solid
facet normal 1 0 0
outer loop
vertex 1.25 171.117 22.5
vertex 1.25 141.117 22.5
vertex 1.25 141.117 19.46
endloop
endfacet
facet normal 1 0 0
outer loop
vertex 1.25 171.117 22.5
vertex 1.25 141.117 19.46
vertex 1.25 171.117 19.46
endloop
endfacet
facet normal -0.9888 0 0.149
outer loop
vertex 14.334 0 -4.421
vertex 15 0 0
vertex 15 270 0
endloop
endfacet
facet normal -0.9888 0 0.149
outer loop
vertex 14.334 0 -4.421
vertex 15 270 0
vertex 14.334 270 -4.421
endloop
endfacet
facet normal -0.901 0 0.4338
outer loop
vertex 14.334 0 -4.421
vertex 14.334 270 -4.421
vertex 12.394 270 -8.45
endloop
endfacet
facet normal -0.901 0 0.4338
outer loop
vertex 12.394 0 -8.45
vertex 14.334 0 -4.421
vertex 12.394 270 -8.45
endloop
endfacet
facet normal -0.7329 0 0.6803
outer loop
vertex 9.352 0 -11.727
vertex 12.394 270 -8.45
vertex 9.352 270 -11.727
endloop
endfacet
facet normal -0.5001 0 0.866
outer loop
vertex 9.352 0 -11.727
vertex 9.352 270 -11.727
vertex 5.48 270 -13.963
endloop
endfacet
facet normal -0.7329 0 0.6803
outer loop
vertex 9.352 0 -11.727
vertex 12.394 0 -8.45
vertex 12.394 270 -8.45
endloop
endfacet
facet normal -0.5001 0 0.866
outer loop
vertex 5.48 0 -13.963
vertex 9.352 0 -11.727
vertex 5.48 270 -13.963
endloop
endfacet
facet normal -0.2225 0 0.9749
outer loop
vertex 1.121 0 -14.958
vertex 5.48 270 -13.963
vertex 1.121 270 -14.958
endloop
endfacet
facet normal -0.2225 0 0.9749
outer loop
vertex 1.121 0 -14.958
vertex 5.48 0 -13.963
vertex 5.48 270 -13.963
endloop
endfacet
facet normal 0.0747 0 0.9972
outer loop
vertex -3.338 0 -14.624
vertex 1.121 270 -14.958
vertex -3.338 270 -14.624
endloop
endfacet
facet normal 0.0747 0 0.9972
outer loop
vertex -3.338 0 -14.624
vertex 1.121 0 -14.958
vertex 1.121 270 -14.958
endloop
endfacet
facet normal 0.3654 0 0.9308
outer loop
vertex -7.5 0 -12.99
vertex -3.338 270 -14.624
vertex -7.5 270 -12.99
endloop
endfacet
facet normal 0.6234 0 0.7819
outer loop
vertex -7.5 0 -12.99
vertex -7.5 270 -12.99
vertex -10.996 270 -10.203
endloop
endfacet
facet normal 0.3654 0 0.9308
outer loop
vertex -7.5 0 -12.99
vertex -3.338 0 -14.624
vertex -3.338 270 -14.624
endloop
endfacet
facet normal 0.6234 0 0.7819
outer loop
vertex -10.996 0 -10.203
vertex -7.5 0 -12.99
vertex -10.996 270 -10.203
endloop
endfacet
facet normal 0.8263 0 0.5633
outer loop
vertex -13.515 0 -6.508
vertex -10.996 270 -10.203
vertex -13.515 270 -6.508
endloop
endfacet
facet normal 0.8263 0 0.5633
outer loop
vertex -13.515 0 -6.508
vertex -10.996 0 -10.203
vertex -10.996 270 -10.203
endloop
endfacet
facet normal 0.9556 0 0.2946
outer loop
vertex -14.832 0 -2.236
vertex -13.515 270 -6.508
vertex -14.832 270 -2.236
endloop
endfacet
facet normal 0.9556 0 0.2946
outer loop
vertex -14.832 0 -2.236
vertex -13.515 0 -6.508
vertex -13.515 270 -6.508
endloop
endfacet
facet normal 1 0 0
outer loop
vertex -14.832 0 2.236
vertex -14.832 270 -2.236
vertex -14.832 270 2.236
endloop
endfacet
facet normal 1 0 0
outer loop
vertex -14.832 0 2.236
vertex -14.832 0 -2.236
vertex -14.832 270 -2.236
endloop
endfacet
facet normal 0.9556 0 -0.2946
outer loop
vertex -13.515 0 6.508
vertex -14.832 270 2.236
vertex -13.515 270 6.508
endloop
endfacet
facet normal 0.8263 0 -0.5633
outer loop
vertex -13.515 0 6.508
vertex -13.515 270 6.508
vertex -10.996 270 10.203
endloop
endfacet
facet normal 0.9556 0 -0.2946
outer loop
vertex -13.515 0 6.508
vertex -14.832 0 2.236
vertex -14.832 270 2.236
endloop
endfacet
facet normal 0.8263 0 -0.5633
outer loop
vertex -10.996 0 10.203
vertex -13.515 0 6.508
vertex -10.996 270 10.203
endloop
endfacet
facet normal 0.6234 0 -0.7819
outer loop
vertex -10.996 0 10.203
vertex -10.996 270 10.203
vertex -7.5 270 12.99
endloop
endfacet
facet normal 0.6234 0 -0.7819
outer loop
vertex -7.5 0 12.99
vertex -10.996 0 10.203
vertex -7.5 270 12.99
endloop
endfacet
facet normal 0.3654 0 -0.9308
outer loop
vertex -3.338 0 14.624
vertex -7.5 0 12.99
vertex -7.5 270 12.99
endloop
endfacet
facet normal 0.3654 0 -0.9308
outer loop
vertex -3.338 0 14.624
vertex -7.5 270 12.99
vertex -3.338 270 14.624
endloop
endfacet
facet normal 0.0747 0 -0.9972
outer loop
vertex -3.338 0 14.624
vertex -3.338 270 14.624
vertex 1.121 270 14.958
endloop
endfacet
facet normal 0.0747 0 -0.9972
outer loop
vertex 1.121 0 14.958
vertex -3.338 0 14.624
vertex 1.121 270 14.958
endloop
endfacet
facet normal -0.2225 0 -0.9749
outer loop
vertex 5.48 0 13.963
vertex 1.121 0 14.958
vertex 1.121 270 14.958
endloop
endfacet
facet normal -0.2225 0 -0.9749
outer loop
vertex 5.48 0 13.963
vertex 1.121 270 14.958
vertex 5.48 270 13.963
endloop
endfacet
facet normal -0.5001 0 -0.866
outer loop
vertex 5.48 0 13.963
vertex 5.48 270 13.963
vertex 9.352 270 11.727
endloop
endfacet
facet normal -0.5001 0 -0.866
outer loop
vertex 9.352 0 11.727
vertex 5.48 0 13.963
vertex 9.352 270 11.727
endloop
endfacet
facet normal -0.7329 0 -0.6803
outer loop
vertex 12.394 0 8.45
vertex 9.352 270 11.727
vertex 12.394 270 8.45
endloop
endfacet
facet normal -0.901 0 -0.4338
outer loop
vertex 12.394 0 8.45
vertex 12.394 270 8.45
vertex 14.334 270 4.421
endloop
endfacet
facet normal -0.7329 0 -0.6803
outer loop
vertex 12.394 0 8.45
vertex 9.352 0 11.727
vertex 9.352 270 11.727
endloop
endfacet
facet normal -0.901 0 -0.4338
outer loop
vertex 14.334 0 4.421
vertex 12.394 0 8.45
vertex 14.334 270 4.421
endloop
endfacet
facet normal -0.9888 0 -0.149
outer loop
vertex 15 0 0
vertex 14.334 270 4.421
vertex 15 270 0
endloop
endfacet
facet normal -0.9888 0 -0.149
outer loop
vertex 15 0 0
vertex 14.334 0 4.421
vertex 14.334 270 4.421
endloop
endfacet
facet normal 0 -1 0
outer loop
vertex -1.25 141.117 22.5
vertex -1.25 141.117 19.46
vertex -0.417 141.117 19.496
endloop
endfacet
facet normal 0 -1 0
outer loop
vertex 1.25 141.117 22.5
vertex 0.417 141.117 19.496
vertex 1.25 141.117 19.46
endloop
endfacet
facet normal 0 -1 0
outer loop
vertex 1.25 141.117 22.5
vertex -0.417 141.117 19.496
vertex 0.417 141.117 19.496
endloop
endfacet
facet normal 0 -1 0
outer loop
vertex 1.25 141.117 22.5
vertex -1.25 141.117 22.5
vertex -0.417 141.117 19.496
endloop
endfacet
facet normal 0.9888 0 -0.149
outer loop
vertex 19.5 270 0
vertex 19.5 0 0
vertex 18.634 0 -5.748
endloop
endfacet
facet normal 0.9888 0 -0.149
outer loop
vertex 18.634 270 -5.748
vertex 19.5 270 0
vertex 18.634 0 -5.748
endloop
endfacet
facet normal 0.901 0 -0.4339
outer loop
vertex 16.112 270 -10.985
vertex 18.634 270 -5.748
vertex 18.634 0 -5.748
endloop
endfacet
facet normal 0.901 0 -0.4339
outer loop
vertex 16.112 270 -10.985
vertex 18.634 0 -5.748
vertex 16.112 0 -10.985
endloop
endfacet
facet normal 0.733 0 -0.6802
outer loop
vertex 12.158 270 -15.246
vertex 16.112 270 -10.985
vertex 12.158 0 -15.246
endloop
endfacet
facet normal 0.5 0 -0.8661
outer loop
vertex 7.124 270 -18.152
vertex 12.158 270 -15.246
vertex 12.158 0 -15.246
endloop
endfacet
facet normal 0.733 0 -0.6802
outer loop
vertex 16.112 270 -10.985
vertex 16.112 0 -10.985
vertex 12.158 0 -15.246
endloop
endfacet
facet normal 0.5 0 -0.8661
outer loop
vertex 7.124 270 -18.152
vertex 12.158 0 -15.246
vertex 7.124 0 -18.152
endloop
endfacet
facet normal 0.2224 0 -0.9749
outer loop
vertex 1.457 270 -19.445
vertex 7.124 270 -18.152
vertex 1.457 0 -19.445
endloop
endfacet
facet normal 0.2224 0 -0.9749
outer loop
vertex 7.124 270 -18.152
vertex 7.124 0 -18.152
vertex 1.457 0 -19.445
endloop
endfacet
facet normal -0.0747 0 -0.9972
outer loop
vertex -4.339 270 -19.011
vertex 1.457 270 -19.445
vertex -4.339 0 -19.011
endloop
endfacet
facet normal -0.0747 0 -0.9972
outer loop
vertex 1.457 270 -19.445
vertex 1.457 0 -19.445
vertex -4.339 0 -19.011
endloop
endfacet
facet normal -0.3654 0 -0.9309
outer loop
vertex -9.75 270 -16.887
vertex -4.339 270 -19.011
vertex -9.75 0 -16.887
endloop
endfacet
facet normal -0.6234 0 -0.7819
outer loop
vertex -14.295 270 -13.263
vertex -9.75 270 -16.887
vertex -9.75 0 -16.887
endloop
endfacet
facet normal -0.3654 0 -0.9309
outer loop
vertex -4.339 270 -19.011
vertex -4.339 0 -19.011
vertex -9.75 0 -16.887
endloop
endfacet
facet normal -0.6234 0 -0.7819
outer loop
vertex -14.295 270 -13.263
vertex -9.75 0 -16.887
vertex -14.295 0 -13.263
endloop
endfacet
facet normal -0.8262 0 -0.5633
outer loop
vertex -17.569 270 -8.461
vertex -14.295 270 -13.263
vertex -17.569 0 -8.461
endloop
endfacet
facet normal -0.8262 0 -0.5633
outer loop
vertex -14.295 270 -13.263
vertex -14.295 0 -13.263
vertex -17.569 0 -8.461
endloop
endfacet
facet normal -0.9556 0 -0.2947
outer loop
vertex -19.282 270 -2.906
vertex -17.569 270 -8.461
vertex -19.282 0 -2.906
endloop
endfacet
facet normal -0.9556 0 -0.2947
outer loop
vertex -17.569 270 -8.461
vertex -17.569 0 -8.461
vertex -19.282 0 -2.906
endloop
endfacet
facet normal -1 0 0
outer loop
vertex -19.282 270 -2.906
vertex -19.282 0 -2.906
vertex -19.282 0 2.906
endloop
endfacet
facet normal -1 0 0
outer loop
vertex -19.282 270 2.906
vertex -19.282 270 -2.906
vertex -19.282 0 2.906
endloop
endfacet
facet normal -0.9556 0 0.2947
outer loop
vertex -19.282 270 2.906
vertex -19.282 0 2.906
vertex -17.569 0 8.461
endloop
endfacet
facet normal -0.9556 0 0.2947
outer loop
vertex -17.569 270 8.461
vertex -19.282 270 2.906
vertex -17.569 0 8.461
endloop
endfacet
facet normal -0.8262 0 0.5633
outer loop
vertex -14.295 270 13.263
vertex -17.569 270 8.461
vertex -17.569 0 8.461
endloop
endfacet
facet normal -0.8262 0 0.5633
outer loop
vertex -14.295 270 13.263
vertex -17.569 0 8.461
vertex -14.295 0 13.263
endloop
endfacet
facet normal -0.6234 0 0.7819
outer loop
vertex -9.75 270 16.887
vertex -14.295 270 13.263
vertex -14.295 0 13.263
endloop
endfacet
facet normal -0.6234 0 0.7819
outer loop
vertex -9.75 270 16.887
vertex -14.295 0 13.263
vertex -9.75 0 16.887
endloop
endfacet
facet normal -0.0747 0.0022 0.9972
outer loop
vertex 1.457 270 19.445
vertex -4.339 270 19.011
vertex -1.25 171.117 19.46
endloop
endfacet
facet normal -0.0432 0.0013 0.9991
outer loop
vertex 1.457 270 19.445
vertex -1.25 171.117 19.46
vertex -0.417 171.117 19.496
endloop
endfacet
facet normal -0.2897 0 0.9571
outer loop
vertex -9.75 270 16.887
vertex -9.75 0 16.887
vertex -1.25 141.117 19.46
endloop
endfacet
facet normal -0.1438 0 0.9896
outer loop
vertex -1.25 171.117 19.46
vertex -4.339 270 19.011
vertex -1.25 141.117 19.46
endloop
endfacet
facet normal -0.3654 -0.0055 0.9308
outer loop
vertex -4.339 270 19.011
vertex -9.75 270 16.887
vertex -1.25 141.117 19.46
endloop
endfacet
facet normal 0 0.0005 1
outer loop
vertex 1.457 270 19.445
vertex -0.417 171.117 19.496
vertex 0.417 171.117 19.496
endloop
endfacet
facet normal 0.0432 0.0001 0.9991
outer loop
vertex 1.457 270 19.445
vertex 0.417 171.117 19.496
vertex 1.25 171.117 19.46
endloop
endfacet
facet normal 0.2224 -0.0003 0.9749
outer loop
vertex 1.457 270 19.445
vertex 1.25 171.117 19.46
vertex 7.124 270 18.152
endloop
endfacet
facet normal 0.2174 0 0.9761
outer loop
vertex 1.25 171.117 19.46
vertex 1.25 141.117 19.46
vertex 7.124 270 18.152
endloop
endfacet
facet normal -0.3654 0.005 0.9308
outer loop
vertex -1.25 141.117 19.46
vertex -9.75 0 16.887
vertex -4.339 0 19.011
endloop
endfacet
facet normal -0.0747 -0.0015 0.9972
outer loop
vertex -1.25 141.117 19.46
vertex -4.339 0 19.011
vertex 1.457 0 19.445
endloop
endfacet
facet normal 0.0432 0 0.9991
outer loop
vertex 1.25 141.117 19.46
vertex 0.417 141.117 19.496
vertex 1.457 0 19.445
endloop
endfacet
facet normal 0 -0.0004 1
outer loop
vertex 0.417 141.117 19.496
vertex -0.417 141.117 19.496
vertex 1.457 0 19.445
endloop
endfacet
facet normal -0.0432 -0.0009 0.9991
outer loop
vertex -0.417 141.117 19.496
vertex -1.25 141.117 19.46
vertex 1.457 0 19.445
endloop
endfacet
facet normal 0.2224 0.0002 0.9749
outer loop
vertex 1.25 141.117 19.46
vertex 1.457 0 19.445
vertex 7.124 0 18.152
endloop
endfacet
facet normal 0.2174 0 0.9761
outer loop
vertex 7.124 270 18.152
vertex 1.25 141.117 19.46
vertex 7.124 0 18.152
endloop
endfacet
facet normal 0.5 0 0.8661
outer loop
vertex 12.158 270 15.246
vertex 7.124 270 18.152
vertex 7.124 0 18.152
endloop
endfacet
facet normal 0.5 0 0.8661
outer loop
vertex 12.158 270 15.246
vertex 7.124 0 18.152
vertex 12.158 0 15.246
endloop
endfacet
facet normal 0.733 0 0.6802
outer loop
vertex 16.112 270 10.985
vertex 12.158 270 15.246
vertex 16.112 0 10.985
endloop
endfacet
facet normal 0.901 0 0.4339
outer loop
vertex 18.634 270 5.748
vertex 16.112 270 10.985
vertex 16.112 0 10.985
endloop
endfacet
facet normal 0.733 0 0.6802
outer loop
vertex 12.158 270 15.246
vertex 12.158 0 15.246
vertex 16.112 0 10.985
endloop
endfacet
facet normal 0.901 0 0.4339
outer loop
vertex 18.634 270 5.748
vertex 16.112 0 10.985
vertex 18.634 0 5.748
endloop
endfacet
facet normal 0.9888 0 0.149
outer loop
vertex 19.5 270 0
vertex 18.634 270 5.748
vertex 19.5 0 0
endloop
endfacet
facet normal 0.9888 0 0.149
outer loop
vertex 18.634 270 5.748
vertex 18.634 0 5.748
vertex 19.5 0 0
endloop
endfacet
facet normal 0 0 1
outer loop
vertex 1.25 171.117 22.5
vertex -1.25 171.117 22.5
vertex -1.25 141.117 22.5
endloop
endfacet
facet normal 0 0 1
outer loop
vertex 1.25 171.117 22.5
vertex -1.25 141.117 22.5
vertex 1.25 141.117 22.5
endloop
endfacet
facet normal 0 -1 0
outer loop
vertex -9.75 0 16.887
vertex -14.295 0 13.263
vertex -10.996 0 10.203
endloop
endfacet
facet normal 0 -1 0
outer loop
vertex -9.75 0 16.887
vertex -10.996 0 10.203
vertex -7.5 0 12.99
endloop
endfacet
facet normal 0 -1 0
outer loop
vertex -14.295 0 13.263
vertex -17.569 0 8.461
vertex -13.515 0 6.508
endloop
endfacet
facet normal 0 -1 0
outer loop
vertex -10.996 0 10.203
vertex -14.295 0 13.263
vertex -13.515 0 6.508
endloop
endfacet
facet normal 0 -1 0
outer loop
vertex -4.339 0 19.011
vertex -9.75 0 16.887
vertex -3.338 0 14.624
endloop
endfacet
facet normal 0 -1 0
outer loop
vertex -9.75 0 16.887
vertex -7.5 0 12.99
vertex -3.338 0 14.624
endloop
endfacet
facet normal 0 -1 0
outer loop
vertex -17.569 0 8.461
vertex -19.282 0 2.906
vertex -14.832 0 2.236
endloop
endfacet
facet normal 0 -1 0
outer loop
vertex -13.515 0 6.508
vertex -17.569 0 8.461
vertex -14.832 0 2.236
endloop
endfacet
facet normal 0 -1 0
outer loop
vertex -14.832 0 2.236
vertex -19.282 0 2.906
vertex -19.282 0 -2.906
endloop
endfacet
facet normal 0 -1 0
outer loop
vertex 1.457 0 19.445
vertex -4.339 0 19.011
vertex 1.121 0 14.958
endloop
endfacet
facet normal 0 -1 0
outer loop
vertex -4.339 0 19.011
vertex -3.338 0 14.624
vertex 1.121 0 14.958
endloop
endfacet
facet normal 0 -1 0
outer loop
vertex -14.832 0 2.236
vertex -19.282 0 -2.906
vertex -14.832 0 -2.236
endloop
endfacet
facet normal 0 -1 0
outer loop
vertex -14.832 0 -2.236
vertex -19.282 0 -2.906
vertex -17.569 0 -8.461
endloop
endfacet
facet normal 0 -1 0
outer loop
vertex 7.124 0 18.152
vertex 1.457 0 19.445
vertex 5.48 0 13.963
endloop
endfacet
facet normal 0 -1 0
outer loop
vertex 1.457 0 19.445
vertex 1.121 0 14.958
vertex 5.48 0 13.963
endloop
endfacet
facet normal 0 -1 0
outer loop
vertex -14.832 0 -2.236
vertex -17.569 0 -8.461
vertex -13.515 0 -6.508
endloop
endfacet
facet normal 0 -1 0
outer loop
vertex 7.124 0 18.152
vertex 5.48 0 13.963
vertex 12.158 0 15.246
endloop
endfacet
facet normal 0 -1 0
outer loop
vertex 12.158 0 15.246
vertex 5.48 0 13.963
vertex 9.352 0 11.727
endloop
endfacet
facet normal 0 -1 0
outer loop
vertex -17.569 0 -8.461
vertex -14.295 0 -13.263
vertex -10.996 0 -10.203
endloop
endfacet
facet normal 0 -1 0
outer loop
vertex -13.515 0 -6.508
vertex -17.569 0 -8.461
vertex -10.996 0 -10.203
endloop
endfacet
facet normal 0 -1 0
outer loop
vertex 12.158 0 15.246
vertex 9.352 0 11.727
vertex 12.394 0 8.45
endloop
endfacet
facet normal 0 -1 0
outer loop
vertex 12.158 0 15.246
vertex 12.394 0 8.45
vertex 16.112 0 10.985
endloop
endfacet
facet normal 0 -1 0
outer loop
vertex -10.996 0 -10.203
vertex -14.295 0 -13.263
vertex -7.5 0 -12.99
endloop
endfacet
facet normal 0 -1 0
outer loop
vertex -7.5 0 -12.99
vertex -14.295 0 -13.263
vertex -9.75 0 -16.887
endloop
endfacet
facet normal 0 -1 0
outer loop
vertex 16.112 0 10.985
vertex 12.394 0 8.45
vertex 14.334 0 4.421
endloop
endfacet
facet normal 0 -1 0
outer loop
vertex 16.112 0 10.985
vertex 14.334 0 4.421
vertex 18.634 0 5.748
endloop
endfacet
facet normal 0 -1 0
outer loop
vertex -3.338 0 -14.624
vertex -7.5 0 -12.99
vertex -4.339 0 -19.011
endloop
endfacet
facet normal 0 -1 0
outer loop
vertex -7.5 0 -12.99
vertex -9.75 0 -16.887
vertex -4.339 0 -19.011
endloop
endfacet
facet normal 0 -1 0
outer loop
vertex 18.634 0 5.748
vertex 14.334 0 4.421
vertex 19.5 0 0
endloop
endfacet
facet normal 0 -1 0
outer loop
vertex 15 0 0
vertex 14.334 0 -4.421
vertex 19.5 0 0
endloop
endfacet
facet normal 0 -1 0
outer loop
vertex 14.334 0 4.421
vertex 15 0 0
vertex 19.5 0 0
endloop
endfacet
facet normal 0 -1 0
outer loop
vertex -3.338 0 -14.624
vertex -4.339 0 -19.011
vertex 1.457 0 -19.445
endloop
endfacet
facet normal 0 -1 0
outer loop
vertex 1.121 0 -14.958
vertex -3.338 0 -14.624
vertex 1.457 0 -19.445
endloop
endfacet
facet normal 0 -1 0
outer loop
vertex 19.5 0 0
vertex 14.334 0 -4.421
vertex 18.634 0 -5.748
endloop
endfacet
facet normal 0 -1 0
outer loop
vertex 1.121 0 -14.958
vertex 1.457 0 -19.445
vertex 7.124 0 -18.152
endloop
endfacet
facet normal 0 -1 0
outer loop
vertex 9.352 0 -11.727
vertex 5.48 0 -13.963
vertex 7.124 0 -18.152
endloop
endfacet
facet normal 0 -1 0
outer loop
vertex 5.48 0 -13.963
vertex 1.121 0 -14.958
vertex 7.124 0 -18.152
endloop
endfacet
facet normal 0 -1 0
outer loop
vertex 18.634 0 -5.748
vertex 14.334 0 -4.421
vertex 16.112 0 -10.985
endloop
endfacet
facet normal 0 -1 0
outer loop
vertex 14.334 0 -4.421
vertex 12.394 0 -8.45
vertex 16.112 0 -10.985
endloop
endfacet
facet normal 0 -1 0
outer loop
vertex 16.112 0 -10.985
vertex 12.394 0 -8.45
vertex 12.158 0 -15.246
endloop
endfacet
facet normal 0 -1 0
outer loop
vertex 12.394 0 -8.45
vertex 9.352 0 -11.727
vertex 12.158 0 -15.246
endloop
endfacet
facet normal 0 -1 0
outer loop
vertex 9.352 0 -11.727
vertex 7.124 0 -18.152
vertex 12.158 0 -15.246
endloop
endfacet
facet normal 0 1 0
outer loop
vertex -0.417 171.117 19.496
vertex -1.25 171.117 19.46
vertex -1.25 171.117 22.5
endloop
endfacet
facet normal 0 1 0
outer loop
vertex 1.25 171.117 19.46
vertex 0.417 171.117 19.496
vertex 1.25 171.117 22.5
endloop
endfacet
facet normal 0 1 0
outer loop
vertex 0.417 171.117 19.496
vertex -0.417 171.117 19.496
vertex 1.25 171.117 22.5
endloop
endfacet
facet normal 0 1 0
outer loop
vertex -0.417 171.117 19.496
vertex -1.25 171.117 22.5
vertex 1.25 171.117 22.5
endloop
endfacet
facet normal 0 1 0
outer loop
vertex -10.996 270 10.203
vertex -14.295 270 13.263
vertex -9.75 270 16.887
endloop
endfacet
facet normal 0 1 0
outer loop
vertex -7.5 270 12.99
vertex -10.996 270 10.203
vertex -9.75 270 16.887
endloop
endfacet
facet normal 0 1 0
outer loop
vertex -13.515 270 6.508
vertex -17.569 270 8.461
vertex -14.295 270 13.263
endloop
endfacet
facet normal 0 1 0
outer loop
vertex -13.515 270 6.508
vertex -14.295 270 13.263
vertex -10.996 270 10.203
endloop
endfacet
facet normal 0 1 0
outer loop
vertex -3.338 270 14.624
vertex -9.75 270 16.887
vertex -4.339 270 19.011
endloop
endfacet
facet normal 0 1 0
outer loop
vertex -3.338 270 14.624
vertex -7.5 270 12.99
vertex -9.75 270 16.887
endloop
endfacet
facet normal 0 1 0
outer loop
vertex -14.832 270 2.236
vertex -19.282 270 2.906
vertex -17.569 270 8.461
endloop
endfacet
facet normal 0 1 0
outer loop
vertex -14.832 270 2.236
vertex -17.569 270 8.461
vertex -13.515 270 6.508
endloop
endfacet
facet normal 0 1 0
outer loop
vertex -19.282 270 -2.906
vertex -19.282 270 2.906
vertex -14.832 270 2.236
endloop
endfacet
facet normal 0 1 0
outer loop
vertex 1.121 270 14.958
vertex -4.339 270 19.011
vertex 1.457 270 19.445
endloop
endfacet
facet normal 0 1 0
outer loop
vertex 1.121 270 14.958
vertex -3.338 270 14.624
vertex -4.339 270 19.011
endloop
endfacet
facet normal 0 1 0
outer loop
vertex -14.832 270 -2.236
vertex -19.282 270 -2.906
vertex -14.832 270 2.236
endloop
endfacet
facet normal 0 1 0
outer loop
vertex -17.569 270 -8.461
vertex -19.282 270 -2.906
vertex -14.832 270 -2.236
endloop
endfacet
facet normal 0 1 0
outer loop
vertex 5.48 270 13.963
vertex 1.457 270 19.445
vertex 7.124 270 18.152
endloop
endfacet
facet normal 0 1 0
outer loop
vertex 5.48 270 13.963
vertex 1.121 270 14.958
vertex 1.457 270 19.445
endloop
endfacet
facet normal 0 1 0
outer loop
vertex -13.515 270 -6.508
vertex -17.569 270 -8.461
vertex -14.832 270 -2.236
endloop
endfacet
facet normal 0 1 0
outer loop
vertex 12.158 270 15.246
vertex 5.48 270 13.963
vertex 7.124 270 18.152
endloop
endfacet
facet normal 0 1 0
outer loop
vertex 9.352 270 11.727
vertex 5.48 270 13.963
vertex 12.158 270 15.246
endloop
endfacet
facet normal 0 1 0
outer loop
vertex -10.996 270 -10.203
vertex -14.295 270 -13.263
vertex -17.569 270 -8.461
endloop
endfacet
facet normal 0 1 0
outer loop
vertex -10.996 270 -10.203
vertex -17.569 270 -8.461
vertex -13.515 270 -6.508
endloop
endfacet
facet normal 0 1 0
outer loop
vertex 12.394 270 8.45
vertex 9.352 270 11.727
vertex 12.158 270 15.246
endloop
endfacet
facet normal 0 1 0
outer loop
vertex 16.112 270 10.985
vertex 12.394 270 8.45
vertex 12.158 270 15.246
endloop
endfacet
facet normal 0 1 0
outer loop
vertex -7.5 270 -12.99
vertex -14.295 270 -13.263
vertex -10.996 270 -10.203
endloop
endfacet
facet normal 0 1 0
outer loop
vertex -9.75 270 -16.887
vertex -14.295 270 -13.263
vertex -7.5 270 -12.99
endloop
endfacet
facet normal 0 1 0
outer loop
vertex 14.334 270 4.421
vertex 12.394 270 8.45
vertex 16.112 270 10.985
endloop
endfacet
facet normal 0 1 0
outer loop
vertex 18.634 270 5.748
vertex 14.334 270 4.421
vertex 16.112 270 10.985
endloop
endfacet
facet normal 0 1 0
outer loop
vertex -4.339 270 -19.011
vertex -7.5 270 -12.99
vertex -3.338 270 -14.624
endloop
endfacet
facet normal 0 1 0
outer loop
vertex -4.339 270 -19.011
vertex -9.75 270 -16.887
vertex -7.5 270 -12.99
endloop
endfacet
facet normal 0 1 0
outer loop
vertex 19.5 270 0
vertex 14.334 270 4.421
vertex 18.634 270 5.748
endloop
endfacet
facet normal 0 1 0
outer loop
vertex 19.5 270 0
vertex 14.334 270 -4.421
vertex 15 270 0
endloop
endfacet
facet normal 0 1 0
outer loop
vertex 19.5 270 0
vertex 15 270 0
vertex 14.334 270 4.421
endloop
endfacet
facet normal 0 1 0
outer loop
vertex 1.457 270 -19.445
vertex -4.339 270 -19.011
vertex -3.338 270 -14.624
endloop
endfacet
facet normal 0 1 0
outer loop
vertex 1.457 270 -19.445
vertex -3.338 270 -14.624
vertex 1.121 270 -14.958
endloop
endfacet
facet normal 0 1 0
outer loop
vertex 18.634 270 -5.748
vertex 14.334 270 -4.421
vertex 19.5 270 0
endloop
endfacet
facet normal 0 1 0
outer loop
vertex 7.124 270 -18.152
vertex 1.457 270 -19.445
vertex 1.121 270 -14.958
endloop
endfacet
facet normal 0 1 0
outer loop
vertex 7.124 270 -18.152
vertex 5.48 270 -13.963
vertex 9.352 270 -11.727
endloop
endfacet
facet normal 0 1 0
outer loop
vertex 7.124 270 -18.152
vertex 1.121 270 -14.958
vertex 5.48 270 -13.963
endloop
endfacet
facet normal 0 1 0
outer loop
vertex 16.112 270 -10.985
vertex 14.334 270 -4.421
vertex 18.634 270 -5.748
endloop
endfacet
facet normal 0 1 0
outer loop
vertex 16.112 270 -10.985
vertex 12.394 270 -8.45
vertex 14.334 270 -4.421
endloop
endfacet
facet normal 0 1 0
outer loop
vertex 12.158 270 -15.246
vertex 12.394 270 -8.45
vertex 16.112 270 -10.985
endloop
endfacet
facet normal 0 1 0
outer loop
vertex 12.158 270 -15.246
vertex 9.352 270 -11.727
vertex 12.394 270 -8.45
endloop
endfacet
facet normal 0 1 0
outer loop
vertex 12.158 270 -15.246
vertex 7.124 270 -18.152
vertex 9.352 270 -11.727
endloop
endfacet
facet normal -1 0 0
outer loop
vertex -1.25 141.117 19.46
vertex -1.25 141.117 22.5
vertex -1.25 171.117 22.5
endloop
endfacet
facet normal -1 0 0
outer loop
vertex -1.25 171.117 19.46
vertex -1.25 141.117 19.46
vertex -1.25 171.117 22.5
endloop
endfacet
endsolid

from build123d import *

# Parameters (mm, degrees)
SKETCH1_R           = 19.5
SKETCH1_R_2         = 15
BOSS_EXTRUDE1_DEPTH = 270
SKETCH3_W           = 2.5
SKETCH3_H           = 30
BOSS_EXTRUDE2_DEPTH = 6


with BuildPart() as part:
    # Sketch1 → Boss-Extrude1 (new body)
    with BuildSketch(Plane(origin=(0, 0, 0), x_dir=(1, 0, 0), z_dir=(0, 1, 0))):
        Circle(SKETCH1_R)
        Circle(SKETCH1_R_2, mode=Mode.SUBTRACT)
    extrude(amount=BOSS_EXTRUDE1_DEPTH)

    # Sketch3 → Boss-Extrude2 (add)
    with BuildSketch(Plane.XY.offset(22.5)):
        with Locations((0, 156.116903923)):
            Rectangle(SKETCH3_W, SKETCH3_H)
    extrude(amount=-BOSS_EXTRUDE2_DEPTH)


solid = part.part
